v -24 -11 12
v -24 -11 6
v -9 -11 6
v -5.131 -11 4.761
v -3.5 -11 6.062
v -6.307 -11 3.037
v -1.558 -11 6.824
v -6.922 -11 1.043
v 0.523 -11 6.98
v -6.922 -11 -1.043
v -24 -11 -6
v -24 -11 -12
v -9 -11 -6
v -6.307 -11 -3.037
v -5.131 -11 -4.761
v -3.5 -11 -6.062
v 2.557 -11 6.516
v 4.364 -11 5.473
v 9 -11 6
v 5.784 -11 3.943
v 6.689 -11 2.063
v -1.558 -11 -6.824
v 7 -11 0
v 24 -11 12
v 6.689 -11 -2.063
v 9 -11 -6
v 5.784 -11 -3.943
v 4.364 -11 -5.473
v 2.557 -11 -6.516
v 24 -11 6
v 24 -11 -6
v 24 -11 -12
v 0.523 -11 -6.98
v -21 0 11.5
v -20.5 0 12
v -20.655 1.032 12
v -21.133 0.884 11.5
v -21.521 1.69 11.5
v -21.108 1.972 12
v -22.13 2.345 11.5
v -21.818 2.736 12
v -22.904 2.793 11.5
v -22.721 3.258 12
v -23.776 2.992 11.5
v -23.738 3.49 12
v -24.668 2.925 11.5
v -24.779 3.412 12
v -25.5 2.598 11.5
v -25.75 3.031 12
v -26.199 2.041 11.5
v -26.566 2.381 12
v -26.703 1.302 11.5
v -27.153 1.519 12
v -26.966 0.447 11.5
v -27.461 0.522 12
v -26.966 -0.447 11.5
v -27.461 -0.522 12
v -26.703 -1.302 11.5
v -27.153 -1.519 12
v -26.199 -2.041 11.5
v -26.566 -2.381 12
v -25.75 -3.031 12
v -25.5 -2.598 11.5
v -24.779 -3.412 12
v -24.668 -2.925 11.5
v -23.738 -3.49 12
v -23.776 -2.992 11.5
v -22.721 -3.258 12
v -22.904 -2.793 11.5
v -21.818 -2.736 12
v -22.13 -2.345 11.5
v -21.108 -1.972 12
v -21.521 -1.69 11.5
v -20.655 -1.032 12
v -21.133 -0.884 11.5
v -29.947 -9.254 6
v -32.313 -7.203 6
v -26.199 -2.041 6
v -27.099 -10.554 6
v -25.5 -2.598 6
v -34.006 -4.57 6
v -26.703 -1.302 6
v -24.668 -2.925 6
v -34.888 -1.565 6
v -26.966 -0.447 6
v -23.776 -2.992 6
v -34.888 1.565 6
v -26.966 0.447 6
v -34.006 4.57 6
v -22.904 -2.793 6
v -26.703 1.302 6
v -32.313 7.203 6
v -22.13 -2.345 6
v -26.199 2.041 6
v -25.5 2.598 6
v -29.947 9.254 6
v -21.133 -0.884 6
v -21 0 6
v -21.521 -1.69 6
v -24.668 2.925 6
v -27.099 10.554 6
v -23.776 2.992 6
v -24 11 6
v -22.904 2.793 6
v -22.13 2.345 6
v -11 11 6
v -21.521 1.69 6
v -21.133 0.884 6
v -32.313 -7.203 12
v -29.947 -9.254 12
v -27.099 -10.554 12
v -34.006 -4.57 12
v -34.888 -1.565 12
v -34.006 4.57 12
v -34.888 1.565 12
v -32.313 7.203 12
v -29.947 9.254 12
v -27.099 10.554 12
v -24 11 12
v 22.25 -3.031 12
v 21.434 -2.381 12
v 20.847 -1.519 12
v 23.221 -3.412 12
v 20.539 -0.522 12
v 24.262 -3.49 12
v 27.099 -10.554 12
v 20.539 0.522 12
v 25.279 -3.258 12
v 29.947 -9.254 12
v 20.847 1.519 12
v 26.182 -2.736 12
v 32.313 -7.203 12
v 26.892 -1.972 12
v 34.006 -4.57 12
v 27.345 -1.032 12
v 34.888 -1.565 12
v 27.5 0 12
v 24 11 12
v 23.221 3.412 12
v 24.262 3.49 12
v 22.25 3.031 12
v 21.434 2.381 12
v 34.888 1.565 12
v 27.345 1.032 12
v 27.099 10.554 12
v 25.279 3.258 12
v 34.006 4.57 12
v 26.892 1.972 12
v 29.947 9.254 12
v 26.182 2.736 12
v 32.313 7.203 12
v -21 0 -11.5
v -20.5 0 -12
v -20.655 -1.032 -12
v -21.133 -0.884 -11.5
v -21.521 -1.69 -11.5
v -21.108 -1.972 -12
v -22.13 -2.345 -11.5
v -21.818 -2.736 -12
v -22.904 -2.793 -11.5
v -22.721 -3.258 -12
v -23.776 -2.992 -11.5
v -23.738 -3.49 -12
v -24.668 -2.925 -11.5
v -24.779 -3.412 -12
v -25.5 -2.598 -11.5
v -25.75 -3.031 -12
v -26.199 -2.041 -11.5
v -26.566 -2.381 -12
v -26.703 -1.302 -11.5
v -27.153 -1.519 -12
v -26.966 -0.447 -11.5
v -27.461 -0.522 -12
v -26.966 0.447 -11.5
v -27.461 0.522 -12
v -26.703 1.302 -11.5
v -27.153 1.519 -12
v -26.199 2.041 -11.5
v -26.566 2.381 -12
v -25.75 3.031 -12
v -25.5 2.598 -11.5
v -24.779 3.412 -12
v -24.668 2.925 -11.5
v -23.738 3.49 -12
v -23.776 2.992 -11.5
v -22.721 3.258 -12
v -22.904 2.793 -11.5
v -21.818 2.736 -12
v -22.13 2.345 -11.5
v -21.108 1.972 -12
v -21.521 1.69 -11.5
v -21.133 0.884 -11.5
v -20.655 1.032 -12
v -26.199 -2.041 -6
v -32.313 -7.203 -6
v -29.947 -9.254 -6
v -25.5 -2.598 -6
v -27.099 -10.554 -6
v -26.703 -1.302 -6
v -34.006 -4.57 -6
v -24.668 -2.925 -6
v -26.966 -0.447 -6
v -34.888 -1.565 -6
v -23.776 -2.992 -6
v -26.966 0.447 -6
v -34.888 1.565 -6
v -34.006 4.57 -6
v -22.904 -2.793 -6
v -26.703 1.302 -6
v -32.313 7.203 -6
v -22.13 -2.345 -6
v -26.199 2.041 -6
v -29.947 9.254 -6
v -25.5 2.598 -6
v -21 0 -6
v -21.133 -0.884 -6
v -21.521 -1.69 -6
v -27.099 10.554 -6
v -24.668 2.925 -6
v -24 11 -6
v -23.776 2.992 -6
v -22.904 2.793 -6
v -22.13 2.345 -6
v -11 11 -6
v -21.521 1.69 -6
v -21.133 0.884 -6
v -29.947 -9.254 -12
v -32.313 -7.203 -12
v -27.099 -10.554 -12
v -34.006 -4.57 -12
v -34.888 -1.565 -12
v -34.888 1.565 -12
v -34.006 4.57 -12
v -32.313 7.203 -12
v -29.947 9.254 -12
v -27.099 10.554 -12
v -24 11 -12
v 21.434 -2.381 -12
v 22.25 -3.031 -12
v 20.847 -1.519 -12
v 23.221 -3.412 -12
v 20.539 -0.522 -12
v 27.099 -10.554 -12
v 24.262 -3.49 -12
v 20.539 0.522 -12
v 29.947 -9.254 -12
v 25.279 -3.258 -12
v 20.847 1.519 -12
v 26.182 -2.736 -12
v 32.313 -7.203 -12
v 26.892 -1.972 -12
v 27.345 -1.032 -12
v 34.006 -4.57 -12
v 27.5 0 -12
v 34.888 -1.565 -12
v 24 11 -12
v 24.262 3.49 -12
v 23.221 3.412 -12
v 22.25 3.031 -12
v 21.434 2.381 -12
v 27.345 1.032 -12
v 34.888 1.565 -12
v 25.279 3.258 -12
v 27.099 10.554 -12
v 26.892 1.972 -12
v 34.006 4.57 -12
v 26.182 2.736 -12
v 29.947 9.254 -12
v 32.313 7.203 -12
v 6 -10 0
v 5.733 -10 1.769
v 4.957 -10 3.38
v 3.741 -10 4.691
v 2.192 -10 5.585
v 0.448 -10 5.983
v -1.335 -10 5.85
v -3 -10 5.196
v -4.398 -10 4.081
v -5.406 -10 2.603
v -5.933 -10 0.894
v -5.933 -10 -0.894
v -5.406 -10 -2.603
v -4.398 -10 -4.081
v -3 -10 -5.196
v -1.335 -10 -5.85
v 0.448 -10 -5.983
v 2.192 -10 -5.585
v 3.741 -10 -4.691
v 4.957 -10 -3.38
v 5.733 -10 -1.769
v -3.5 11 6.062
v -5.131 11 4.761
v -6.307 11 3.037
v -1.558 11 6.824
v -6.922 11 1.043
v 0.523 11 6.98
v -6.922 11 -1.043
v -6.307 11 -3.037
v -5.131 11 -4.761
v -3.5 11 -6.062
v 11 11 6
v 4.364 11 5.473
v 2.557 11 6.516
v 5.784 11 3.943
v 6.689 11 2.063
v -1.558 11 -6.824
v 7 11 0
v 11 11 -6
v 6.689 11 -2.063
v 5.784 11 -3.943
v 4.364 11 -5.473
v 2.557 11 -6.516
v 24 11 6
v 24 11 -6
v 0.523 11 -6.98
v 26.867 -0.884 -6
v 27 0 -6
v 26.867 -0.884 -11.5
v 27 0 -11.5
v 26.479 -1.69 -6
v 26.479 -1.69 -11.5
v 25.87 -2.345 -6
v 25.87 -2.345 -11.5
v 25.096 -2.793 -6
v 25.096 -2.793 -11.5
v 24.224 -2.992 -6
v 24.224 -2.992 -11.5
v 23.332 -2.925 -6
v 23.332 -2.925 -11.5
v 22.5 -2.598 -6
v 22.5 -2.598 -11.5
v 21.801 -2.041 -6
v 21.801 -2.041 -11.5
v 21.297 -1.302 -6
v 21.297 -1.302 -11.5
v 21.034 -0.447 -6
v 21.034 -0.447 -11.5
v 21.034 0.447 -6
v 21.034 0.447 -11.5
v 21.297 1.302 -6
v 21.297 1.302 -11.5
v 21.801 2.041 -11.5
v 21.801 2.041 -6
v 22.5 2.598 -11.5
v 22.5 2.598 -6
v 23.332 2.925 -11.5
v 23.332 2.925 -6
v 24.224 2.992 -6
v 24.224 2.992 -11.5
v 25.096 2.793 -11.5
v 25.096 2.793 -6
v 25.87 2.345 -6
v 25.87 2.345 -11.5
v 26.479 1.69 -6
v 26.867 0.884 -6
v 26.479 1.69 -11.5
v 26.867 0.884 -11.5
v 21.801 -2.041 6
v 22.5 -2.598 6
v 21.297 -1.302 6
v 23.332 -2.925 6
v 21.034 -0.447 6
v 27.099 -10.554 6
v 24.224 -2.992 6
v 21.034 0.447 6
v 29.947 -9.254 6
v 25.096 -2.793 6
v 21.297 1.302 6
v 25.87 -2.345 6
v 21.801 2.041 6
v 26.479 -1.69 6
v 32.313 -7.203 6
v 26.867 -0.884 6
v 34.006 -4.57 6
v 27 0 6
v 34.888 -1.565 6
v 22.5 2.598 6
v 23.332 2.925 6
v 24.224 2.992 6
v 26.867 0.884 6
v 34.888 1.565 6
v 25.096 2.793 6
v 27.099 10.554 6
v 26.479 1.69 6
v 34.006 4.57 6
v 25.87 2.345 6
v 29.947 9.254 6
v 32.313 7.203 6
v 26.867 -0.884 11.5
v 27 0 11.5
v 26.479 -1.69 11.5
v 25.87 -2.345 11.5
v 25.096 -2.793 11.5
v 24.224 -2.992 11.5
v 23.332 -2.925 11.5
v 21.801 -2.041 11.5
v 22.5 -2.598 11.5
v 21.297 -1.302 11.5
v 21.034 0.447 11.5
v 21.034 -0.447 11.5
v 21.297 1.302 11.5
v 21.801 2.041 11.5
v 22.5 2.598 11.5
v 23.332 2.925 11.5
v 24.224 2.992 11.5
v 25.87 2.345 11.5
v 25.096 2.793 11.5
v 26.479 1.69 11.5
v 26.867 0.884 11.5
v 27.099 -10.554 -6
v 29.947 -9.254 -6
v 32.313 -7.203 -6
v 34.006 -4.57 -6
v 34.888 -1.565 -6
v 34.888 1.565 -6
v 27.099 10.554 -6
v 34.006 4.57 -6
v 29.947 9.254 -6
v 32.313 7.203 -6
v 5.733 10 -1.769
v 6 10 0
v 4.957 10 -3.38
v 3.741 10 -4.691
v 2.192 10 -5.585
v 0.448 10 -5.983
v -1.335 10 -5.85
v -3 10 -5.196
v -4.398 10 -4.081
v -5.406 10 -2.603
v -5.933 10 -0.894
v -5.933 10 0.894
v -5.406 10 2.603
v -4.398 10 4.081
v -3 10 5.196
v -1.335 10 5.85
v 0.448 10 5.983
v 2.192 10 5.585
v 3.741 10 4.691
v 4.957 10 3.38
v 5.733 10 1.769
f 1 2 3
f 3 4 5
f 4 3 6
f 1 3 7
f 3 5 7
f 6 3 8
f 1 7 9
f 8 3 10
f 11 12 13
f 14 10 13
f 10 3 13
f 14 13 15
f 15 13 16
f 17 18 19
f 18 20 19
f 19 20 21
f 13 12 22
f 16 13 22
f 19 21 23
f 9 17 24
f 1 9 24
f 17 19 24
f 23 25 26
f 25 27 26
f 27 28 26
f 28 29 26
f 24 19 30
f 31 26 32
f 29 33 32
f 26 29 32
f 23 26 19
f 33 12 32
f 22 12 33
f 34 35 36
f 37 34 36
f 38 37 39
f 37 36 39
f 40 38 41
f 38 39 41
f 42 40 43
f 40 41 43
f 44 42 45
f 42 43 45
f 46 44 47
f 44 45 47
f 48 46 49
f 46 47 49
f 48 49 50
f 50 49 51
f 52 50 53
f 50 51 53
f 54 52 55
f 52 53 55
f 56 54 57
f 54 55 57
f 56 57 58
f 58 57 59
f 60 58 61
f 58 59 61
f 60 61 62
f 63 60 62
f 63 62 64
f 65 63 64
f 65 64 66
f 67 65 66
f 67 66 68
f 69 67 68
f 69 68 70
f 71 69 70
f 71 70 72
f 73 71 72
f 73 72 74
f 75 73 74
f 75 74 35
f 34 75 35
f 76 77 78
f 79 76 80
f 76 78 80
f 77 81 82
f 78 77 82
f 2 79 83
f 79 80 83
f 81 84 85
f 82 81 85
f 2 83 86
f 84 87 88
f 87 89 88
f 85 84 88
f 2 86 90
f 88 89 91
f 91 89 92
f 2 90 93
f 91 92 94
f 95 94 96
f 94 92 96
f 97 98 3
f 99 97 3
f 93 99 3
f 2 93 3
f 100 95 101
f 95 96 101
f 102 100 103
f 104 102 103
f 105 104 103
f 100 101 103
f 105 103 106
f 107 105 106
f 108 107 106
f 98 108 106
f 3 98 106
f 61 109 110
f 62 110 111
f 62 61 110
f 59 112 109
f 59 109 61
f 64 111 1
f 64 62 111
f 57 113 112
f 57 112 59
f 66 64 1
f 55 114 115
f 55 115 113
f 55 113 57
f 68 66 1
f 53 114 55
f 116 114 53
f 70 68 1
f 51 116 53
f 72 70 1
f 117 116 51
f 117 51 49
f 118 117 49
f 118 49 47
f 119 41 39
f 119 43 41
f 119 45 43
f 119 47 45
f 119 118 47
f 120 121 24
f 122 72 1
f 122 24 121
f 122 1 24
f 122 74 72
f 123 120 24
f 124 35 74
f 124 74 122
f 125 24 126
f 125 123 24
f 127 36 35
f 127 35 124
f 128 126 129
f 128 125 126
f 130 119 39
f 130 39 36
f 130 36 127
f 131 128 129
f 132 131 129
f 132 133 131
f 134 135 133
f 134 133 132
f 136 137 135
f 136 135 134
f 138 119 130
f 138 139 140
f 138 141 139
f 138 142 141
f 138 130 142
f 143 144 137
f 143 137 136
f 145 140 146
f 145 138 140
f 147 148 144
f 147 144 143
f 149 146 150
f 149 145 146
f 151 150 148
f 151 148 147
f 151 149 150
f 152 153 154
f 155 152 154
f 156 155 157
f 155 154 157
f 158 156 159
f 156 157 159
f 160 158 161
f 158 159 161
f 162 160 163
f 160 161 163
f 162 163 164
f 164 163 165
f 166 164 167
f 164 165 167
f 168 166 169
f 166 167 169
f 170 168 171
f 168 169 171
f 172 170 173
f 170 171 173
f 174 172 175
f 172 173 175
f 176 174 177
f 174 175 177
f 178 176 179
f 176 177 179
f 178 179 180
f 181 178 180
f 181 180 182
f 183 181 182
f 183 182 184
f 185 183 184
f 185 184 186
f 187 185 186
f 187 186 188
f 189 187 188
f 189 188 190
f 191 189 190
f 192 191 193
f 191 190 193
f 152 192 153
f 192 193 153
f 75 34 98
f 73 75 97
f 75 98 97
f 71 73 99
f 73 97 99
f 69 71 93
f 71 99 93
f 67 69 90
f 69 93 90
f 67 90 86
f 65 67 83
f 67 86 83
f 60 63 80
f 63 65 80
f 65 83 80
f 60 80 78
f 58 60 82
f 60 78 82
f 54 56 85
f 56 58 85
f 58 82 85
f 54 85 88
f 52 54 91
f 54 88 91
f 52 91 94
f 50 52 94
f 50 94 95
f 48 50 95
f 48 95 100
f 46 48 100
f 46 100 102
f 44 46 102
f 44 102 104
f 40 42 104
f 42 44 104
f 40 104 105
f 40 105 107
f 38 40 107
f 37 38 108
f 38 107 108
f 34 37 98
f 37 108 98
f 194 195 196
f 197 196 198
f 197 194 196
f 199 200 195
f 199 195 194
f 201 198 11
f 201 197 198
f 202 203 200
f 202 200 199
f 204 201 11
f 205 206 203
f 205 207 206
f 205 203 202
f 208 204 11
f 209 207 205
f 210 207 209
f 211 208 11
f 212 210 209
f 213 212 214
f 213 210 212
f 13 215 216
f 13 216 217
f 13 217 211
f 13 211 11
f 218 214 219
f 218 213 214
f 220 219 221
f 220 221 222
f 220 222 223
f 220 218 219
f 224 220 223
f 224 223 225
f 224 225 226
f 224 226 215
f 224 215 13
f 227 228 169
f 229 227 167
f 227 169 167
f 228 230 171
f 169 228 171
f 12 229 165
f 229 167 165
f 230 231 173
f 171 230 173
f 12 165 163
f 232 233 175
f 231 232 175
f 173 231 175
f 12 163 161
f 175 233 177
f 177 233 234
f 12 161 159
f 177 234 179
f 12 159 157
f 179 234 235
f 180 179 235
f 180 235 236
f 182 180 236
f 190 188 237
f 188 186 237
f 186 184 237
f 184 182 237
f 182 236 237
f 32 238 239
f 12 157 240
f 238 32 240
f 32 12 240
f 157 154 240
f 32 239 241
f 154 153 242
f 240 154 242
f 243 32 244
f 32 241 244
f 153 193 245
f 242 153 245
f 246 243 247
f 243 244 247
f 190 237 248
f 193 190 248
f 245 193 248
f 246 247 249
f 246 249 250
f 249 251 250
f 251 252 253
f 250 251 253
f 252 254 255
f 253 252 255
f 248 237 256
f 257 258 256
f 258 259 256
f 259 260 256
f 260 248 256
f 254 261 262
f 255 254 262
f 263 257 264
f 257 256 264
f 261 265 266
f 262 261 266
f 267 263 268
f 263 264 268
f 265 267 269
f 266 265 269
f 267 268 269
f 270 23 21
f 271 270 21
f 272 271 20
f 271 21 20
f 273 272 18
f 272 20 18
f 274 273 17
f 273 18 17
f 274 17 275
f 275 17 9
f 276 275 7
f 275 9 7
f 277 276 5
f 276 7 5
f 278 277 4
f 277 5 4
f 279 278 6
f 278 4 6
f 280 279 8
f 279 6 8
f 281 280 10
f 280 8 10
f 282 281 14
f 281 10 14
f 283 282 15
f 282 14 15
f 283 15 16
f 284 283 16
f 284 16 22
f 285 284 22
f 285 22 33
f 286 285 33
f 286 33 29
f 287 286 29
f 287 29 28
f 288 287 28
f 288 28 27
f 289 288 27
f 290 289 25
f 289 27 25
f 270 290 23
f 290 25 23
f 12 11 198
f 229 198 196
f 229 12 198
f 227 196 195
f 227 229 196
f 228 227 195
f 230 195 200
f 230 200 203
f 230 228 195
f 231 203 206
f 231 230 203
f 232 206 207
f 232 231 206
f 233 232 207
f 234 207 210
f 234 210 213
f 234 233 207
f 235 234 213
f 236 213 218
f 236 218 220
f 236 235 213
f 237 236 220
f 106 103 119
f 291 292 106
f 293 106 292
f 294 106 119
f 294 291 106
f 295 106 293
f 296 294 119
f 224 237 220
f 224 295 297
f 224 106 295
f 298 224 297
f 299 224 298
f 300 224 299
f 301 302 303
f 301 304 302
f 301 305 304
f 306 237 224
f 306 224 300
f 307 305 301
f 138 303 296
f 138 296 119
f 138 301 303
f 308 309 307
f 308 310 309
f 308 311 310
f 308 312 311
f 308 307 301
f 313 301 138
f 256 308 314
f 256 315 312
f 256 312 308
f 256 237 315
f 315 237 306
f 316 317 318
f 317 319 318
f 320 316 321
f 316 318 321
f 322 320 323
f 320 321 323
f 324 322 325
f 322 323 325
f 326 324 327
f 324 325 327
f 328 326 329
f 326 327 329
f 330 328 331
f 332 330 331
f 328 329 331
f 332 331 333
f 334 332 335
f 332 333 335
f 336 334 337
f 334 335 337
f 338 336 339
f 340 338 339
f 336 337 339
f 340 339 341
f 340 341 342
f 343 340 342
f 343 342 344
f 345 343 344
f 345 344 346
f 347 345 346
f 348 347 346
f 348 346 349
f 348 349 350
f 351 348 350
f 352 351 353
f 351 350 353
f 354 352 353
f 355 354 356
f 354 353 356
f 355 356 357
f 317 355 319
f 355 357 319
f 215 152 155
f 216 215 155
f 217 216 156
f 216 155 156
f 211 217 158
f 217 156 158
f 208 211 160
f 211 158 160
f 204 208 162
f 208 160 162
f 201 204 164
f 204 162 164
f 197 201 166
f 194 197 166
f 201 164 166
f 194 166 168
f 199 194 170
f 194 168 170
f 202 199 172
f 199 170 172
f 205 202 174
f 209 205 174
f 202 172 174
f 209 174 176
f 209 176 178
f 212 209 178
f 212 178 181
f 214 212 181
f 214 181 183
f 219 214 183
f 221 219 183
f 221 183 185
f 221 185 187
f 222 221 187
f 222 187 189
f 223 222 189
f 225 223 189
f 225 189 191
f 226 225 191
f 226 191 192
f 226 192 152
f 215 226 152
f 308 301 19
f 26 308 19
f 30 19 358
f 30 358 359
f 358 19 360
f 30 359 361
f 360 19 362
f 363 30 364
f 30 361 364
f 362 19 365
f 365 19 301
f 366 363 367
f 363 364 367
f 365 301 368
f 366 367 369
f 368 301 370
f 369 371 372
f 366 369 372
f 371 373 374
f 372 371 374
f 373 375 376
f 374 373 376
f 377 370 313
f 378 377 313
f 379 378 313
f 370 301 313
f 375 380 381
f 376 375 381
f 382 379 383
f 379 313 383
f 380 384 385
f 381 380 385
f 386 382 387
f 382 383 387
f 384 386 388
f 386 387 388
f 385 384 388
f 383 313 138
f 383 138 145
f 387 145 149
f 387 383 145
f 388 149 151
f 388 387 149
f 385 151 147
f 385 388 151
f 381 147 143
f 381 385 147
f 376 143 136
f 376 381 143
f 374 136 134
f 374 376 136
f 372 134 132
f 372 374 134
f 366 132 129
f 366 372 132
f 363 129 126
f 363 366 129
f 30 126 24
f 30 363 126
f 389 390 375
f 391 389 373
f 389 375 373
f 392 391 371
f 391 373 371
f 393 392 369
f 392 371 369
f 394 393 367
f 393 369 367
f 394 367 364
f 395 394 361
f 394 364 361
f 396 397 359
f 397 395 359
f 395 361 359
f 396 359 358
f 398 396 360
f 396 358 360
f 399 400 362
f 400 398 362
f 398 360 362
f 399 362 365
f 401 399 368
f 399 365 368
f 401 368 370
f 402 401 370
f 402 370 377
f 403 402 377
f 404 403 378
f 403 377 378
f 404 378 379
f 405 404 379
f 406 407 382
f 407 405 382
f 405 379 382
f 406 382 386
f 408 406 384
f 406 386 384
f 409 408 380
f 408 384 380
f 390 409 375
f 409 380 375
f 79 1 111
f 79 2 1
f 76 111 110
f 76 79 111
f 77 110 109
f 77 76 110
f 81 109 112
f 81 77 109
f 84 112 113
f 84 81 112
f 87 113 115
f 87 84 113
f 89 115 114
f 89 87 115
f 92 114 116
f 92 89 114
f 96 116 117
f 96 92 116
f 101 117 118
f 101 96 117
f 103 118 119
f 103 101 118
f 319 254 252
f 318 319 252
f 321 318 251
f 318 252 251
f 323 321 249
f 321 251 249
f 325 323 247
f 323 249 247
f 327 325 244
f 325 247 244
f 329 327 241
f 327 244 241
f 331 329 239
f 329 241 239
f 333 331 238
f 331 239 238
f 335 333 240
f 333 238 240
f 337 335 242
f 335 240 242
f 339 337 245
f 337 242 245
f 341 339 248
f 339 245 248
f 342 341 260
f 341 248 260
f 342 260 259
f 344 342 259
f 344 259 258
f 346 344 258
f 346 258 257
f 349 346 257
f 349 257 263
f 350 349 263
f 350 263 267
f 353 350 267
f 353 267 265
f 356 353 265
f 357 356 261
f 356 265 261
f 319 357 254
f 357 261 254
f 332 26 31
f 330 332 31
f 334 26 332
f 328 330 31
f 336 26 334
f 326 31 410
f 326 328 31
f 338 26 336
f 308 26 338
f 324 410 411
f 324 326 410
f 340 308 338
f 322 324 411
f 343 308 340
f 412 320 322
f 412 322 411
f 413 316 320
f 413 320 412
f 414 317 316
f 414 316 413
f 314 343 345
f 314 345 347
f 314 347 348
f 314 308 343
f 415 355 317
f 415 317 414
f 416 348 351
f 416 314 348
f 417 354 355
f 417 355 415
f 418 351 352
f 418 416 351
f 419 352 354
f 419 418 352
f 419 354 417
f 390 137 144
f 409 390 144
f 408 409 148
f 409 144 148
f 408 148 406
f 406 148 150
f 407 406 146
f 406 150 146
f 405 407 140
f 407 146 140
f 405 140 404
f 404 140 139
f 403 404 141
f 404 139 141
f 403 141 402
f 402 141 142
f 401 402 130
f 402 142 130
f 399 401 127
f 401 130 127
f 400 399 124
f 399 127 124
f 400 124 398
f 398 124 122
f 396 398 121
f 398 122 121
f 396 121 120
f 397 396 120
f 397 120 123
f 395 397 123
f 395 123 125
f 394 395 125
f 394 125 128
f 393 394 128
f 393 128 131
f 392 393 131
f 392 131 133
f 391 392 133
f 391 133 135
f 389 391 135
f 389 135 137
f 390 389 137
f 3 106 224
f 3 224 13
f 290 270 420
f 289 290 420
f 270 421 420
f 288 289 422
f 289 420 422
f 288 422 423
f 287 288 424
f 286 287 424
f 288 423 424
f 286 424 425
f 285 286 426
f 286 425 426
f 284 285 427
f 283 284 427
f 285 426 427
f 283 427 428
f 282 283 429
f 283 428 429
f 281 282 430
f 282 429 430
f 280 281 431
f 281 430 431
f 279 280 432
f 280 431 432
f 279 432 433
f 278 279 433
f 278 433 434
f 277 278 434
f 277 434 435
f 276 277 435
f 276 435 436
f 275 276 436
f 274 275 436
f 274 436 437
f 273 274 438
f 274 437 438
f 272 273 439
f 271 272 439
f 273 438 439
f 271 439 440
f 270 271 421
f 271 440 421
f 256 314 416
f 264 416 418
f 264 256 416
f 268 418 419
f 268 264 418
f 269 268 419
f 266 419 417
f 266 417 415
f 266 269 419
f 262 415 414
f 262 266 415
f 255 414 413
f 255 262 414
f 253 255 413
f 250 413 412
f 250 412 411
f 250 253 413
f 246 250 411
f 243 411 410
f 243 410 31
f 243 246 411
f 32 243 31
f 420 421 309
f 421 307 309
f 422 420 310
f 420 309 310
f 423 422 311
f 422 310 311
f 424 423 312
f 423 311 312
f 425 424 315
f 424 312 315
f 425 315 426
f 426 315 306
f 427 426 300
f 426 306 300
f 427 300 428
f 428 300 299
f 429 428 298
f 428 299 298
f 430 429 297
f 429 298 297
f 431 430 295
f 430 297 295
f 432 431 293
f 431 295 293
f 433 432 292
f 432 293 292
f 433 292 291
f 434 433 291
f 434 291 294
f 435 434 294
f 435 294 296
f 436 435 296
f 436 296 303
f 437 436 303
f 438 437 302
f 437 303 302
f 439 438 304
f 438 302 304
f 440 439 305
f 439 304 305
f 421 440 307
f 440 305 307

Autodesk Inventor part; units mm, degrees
ref_plane "YZ Plane" through (0, 0, 0) normal (1, 0, 0) x (0, 1, 0)
ref_plane "XZ Plane" through (0, 0, 0) normal (0, 1, 0) x (-1, 0, 0)
sketch "Náčrt1" plane through (0, 0, 0) normal (0, 0, 1) x (1, 0, 0)
  line L0 (0, -15.4) -> (0, 15.4) construction
  line L1 (-49, 0) -> (49, 0) construction
  arc A0 (-24, 11) -> (-24, -11) centre (-24, 0) ccw
  arc A1 (24, -11) -> (24, 11) centre (24, 0) ccw
  line L2 (-24, 11) -> (24, 11)
  line L3 (-24, -11) -> (24, -11)
  circle A2 centre (-24, 0) radius 3
  circle A3 centre (24, 0) radius 3
  point P0 (0, 0)
  point P1 (0, -11)
  point P2 (0, 11)
  dimension "d0" = 22
  dimension "d1" = 22
  dimension "d2" = 48
  dimension "d3" = 6
  dimension "d4" = 6
extrude "Vysunutí1" add sketch "Náčrt1" along normal mid plane 24
ref_plane "Pracovní rovina1" through (0, 0, 6) normal (0, 0, 1) x (1, 0, 0)
sketch "Náčrt2" plane through (0, 0, 6) normal (0, 0, 1) x (1, 0, 0)
  line L0 (-56, 0) -> (56, 0) construction
  line L1 (0, -15.4) -> (0, 15.4) construction
  line L2 (11, 11) -> (9, -11)
  line L3 (9, -11) -> (40, -11)
  line L4 (40, -11) -> (40, 11)
  line L5 (40, 11) -> (11, 11)
  line L6 (24, 11) -> (-24, 11) construction
  line L7 (-24, -11) -> (24, -11) construction
  line L8 (-11, 11) -> (-9, -11)
  line L9 (-9, -11) -> (-40, -11)
  line L10 (-40, -11) -> (-40, 11)
  line L11 (-40, 11) -> (-11, 11)
  point P0 (0, 0)
  dimension "d10" = 11
  dimension "d11" = 9
  dimension "d12" = 40
  dimension "d15" = 0
  dimension "d16" = 0
extrude "Vysunutí3" cut sketch "Náčrt2" against normal blind 12
sketch "Náčrt3" plane through (-24, 11, -12) normal (0, 1, 0) x (1, 0, 0)
  circle A0 centre (24, -12) radius 6
  dimension "d19" = 12
extrude "Vysunutí4" cut sketch "Náčrt3" against normal up to next
chamfer "Zkosení1" distance 1 angle 45 2 edges at (-6, 11, 0) (-6, -11, 0)
chamfer "Zkosení2" distance 0.5 angle 45 4 edges at (-27, 0, 12) (21, 0, 12) (21, 0, -12) (-27, 0, -12)
thread "Závit1" size "M12x1" class "6H" standard "ISO Metric profile" full length
properties part number "Součást25"
